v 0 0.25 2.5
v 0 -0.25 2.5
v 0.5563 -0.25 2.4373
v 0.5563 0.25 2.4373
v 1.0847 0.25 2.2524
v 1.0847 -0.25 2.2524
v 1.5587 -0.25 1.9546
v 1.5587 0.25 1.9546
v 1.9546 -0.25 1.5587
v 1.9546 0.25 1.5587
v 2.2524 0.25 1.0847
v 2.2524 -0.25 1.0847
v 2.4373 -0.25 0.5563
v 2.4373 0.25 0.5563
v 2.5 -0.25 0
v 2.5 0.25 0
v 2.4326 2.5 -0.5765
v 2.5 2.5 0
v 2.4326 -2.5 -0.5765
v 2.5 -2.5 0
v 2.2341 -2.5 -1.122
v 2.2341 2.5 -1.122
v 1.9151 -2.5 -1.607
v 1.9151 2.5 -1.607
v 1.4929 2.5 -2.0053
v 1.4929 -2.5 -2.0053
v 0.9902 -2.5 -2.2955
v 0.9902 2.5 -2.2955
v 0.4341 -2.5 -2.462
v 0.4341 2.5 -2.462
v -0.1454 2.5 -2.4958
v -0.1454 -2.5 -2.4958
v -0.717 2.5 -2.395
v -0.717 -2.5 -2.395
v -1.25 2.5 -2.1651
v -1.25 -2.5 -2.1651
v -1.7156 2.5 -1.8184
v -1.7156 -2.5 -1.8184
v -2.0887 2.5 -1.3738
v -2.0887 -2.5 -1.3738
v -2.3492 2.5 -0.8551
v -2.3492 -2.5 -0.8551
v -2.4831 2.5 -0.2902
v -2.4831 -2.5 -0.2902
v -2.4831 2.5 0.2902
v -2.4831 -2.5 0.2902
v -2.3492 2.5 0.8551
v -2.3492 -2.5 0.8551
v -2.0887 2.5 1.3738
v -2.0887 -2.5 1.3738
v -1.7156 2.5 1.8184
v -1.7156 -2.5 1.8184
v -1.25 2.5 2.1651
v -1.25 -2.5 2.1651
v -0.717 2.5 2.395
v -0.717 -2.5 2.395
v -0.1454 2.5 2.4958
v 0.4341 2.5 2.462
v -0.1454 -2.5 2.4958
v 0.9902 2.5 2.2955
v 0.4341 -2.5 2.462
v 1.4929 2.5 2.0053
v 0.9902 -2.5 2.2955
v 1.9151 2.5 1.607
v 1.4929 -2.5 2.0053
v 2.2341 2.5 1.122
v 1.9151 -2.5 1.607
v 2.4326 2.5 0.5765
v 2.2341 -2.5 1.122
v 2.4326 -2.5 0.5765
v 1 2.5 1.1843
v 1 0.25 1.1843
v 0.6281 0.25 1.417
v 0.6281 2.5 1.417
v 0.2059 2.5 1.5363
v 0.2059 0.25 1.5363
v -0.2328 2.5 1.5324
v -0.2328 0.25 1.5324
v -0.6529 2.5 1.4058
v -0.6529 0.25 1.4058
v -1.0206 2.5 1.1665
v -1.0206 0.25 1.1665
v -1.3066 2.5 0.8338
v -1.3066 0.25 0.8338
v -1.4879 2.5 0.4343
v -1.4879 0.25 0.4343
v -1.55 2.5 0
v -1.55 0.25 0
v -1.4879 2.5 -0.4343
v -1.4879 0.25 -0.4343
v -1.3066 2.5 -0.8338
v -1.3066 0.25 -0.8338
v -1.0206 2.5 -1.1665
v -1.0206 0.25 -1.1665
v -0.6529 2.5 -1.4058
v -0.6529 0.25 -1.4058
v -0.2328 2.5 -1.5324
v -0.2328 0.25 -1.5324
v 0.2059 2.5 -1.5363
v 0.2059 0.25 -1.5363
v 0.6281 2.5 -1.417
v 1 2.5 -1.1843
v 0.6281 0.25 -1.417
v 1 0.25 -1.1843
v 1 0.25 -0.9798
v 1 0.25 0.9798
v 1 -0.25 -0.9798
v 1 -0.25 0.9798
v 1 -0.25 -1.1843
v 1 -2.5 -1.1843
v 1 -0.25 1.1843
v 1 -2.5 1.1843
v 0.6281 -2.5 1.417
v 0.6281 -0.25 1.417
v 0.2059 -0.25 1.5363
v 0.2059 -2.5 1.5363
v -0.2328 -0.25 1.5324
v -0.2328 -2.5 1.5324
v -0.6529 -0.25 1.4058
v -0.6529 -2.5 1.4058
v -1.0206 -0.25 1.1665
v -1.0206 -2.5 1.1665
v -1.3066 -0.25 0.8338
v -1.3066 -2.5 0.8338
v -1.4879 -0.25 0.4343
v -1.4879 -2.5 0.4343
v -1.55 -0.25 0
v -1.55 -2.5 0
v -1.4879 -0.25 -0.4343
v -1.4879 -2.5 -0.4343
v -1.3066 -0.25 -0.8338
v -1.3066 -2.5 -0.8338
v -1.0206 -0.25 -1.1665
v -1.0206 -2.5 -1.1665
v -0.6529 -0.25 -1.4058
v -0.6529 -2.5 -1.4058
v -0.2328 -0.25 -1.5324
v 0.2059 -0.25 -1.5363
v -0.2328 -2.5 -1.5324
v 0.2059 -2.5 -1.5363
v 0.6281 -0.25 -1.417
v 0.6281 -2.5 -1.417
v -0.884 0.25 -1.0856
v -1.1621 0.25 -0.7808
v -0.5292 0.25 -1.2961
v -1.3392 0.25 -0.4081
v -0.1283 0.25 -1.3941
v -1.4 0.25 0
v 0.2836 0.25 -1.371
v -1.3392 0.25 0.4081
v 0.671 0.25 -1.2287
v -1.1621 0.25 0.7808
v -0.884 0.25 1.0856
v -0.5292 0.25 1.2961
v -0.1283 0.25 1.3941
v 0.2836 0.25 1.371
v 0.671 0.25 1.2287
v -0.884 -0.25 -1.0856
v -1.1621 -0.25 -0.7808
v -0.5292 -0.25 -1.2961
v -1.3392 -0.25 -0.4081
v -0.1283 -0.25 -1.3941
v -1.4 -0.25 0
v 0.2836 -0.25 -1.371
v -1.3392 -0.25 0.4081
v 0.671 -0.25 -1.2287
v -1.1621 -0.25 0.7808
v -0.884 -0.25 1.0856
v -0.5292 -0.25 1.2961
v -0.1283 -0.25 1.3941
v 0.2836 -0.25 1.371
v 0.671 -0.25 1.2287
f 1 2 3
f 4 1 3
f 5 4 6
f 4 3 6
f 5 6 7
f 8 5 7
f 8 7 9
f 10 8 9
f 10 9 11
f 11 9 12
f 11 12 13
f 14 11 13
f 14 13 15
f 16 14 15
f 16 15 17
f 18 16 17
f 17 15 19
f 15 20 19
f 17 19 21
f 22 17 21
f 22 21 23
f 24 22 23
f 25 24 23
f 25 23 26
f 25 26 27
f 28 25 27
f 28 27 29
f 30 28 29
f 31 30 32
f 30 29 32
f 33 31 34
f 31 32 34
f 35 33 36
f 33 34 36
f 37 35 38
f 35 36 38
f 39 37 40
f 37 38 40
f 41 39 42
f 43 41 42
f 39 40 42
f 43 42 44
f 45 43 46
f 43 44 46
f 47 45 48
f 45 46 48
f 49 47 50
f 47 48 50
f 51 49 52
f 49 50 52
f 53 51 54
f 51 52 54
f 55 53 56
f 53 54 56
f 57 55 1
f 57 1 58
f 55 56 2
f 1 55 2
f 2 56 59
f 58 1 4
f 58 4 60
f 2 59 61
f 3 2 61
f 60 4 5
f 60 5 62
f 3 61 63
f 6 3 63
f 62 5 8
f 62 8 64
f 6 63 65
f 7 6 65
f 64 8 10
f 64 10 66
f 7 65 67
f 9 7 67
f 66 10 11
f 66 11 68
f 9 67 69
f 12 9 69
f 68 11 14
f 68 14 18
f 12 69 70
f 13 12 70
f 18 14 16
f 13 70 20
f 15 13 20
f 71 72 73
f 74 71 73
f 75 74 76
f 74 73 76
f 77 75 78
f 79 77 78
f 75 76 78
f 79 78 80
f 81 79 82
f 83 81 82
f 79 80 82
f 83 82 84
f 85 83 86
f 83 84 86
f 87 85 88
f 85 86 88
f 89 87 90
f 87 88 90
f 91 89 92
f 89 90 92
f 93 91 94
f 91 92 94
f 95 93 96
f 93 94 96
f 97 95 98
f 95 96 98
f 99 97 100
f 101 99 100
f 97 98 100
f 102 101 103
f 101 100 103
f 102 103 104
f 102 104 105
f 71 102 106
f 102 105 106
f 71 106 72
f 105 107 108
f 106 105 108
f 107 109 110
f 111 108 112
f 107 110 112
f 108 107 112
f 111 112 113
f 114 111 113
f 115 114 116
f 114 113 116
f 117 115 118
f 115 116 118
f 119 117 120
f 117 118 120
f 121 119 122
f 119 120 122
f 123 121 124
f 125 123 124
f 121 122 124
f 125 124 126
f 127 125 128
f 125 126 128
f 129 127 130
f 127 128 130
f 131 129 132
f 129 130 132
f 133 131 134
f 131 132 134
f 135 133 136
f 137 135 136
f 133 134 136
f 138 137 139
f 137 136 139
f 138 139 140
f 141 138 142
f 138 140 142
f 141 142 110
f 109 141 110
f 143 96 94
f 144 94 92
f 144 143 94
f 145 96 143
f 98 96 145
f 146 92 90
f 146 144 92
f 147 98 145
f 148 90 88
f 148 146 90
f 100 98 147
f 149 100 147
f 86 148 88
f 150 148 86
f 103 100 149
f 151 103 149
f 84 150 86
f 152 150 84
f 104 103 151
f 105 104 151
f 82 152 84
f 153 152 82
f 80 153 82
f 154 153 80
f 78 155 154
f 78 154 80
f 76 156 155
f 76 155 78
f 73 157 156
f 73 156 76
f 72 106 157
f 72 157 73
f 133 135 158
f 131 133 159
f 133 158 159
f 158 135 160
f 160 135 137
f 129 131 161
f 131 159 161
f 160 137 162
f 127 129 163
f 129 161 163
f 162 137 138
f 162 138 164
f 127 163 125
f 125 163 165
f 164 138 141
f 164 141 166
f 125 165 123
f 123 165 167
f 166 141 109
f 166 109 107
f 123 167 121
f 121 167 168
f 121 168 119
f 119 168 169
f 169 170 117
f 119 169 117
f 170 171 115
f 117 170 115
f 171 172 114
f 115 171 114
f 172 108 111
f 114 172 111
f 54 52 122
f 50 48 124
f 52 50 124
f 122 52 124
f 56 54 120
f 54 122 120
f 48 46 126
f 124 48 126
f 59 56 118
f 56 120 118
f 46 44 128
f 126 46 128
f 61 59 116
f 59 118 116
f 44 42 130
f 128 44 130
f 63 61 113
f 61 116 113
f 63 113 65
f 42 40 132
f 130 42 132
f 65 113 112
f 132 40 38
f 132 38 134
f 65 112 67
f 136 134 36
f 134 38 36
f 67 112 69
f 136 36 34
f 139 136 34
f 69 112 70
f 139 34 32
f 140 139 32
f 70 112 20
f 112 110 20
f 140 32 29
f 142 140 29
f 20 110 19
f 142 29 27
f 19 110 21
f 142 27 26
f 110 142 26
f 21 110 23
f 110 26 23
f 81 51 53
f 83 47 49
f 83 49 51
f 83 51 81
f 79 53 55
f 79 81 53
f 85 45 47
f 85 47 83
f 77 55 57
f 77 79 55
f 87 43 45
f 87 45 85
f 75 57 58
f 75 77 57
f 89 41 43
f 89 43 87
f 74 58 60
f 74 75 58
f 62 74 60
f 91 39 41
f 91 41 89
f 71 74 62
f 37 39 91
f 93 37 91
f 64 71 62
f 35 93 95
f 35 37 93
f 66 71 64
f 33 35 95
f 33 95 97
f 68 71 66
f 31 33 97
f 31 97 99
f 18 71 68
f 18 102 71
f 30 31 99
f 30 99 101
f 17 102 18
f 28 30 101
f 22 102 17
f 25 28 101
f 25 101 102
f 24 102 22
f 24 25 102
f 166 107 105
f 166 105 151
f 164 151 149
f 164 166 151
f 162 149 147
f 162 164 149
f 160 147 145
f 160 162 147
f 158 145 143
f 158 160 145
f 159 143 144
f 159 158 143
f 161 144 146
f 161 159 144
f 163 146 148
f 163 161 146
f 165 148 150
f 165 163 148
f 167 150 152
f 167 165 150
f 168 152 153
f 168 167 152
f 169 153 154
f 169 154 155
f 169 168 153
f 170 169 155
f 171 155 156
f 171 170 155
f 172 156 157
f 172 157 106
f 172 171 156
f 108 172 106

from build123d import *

# Parameters (mm, degrees)
EXTRUDE_1_DEPTH      = 0.25
EXTRUDE_1_DEPTH_BACK = 0.25
SKETCH_1_R           = 2.5
SKETCH_1_R_2         = 1.4
EXTRUDE_2_DEPTH      = 2.5
EXTRUDE_2_DEPTH_BACK = 2.5
SKETCH_1_3_R         = 2.5


with BuildPart() as part:
    # 草图1 → 凸台-拉伸1 (new, two sides: drawn at the far end of the back side and taken through both)
    with BuildSketch(Plane(origin=(0, 0, 0), x_dir=(1, 0, 0), z_dir=(0, 1, 0)).offset(-EXTRUDE_1_DEPTH_BACK)):
        Circle(SKETCH_1_R)
        Circle(SKETCH_1_R_2, mode=Mode.SUBTRACT)
    extrude(amount=EXTRUDE_1_DEPTH + EXTRUDE_1_DEPTH_BACK)

    # 草图1<3> → 凸台-拉伸2 (add, two sides: drawn at the far end of the back side and taken through both)
    with BuildSketch(Plane(origin=(0, 0, 0), x_dir=(1, 0, 0), z_dir=(0, 1, 0)).offset(-EXTRUDE_2_DEPTH_BACK)):
        Circle(SKETCH_1_3_R)
        with BuildLine():
            ThreePointArc((1, -1.184271928), (-1.55, 0), (1, 1.184271928))
            Line((1, 1.184271928), (1, -1.184271928))
        make_face(mode=Mode.SUBTRACT)
    extrude(amount=EXTRUDE_2_DEPTH + EXTRUDE_2_DEPTH_BACK)


solid = part.part
